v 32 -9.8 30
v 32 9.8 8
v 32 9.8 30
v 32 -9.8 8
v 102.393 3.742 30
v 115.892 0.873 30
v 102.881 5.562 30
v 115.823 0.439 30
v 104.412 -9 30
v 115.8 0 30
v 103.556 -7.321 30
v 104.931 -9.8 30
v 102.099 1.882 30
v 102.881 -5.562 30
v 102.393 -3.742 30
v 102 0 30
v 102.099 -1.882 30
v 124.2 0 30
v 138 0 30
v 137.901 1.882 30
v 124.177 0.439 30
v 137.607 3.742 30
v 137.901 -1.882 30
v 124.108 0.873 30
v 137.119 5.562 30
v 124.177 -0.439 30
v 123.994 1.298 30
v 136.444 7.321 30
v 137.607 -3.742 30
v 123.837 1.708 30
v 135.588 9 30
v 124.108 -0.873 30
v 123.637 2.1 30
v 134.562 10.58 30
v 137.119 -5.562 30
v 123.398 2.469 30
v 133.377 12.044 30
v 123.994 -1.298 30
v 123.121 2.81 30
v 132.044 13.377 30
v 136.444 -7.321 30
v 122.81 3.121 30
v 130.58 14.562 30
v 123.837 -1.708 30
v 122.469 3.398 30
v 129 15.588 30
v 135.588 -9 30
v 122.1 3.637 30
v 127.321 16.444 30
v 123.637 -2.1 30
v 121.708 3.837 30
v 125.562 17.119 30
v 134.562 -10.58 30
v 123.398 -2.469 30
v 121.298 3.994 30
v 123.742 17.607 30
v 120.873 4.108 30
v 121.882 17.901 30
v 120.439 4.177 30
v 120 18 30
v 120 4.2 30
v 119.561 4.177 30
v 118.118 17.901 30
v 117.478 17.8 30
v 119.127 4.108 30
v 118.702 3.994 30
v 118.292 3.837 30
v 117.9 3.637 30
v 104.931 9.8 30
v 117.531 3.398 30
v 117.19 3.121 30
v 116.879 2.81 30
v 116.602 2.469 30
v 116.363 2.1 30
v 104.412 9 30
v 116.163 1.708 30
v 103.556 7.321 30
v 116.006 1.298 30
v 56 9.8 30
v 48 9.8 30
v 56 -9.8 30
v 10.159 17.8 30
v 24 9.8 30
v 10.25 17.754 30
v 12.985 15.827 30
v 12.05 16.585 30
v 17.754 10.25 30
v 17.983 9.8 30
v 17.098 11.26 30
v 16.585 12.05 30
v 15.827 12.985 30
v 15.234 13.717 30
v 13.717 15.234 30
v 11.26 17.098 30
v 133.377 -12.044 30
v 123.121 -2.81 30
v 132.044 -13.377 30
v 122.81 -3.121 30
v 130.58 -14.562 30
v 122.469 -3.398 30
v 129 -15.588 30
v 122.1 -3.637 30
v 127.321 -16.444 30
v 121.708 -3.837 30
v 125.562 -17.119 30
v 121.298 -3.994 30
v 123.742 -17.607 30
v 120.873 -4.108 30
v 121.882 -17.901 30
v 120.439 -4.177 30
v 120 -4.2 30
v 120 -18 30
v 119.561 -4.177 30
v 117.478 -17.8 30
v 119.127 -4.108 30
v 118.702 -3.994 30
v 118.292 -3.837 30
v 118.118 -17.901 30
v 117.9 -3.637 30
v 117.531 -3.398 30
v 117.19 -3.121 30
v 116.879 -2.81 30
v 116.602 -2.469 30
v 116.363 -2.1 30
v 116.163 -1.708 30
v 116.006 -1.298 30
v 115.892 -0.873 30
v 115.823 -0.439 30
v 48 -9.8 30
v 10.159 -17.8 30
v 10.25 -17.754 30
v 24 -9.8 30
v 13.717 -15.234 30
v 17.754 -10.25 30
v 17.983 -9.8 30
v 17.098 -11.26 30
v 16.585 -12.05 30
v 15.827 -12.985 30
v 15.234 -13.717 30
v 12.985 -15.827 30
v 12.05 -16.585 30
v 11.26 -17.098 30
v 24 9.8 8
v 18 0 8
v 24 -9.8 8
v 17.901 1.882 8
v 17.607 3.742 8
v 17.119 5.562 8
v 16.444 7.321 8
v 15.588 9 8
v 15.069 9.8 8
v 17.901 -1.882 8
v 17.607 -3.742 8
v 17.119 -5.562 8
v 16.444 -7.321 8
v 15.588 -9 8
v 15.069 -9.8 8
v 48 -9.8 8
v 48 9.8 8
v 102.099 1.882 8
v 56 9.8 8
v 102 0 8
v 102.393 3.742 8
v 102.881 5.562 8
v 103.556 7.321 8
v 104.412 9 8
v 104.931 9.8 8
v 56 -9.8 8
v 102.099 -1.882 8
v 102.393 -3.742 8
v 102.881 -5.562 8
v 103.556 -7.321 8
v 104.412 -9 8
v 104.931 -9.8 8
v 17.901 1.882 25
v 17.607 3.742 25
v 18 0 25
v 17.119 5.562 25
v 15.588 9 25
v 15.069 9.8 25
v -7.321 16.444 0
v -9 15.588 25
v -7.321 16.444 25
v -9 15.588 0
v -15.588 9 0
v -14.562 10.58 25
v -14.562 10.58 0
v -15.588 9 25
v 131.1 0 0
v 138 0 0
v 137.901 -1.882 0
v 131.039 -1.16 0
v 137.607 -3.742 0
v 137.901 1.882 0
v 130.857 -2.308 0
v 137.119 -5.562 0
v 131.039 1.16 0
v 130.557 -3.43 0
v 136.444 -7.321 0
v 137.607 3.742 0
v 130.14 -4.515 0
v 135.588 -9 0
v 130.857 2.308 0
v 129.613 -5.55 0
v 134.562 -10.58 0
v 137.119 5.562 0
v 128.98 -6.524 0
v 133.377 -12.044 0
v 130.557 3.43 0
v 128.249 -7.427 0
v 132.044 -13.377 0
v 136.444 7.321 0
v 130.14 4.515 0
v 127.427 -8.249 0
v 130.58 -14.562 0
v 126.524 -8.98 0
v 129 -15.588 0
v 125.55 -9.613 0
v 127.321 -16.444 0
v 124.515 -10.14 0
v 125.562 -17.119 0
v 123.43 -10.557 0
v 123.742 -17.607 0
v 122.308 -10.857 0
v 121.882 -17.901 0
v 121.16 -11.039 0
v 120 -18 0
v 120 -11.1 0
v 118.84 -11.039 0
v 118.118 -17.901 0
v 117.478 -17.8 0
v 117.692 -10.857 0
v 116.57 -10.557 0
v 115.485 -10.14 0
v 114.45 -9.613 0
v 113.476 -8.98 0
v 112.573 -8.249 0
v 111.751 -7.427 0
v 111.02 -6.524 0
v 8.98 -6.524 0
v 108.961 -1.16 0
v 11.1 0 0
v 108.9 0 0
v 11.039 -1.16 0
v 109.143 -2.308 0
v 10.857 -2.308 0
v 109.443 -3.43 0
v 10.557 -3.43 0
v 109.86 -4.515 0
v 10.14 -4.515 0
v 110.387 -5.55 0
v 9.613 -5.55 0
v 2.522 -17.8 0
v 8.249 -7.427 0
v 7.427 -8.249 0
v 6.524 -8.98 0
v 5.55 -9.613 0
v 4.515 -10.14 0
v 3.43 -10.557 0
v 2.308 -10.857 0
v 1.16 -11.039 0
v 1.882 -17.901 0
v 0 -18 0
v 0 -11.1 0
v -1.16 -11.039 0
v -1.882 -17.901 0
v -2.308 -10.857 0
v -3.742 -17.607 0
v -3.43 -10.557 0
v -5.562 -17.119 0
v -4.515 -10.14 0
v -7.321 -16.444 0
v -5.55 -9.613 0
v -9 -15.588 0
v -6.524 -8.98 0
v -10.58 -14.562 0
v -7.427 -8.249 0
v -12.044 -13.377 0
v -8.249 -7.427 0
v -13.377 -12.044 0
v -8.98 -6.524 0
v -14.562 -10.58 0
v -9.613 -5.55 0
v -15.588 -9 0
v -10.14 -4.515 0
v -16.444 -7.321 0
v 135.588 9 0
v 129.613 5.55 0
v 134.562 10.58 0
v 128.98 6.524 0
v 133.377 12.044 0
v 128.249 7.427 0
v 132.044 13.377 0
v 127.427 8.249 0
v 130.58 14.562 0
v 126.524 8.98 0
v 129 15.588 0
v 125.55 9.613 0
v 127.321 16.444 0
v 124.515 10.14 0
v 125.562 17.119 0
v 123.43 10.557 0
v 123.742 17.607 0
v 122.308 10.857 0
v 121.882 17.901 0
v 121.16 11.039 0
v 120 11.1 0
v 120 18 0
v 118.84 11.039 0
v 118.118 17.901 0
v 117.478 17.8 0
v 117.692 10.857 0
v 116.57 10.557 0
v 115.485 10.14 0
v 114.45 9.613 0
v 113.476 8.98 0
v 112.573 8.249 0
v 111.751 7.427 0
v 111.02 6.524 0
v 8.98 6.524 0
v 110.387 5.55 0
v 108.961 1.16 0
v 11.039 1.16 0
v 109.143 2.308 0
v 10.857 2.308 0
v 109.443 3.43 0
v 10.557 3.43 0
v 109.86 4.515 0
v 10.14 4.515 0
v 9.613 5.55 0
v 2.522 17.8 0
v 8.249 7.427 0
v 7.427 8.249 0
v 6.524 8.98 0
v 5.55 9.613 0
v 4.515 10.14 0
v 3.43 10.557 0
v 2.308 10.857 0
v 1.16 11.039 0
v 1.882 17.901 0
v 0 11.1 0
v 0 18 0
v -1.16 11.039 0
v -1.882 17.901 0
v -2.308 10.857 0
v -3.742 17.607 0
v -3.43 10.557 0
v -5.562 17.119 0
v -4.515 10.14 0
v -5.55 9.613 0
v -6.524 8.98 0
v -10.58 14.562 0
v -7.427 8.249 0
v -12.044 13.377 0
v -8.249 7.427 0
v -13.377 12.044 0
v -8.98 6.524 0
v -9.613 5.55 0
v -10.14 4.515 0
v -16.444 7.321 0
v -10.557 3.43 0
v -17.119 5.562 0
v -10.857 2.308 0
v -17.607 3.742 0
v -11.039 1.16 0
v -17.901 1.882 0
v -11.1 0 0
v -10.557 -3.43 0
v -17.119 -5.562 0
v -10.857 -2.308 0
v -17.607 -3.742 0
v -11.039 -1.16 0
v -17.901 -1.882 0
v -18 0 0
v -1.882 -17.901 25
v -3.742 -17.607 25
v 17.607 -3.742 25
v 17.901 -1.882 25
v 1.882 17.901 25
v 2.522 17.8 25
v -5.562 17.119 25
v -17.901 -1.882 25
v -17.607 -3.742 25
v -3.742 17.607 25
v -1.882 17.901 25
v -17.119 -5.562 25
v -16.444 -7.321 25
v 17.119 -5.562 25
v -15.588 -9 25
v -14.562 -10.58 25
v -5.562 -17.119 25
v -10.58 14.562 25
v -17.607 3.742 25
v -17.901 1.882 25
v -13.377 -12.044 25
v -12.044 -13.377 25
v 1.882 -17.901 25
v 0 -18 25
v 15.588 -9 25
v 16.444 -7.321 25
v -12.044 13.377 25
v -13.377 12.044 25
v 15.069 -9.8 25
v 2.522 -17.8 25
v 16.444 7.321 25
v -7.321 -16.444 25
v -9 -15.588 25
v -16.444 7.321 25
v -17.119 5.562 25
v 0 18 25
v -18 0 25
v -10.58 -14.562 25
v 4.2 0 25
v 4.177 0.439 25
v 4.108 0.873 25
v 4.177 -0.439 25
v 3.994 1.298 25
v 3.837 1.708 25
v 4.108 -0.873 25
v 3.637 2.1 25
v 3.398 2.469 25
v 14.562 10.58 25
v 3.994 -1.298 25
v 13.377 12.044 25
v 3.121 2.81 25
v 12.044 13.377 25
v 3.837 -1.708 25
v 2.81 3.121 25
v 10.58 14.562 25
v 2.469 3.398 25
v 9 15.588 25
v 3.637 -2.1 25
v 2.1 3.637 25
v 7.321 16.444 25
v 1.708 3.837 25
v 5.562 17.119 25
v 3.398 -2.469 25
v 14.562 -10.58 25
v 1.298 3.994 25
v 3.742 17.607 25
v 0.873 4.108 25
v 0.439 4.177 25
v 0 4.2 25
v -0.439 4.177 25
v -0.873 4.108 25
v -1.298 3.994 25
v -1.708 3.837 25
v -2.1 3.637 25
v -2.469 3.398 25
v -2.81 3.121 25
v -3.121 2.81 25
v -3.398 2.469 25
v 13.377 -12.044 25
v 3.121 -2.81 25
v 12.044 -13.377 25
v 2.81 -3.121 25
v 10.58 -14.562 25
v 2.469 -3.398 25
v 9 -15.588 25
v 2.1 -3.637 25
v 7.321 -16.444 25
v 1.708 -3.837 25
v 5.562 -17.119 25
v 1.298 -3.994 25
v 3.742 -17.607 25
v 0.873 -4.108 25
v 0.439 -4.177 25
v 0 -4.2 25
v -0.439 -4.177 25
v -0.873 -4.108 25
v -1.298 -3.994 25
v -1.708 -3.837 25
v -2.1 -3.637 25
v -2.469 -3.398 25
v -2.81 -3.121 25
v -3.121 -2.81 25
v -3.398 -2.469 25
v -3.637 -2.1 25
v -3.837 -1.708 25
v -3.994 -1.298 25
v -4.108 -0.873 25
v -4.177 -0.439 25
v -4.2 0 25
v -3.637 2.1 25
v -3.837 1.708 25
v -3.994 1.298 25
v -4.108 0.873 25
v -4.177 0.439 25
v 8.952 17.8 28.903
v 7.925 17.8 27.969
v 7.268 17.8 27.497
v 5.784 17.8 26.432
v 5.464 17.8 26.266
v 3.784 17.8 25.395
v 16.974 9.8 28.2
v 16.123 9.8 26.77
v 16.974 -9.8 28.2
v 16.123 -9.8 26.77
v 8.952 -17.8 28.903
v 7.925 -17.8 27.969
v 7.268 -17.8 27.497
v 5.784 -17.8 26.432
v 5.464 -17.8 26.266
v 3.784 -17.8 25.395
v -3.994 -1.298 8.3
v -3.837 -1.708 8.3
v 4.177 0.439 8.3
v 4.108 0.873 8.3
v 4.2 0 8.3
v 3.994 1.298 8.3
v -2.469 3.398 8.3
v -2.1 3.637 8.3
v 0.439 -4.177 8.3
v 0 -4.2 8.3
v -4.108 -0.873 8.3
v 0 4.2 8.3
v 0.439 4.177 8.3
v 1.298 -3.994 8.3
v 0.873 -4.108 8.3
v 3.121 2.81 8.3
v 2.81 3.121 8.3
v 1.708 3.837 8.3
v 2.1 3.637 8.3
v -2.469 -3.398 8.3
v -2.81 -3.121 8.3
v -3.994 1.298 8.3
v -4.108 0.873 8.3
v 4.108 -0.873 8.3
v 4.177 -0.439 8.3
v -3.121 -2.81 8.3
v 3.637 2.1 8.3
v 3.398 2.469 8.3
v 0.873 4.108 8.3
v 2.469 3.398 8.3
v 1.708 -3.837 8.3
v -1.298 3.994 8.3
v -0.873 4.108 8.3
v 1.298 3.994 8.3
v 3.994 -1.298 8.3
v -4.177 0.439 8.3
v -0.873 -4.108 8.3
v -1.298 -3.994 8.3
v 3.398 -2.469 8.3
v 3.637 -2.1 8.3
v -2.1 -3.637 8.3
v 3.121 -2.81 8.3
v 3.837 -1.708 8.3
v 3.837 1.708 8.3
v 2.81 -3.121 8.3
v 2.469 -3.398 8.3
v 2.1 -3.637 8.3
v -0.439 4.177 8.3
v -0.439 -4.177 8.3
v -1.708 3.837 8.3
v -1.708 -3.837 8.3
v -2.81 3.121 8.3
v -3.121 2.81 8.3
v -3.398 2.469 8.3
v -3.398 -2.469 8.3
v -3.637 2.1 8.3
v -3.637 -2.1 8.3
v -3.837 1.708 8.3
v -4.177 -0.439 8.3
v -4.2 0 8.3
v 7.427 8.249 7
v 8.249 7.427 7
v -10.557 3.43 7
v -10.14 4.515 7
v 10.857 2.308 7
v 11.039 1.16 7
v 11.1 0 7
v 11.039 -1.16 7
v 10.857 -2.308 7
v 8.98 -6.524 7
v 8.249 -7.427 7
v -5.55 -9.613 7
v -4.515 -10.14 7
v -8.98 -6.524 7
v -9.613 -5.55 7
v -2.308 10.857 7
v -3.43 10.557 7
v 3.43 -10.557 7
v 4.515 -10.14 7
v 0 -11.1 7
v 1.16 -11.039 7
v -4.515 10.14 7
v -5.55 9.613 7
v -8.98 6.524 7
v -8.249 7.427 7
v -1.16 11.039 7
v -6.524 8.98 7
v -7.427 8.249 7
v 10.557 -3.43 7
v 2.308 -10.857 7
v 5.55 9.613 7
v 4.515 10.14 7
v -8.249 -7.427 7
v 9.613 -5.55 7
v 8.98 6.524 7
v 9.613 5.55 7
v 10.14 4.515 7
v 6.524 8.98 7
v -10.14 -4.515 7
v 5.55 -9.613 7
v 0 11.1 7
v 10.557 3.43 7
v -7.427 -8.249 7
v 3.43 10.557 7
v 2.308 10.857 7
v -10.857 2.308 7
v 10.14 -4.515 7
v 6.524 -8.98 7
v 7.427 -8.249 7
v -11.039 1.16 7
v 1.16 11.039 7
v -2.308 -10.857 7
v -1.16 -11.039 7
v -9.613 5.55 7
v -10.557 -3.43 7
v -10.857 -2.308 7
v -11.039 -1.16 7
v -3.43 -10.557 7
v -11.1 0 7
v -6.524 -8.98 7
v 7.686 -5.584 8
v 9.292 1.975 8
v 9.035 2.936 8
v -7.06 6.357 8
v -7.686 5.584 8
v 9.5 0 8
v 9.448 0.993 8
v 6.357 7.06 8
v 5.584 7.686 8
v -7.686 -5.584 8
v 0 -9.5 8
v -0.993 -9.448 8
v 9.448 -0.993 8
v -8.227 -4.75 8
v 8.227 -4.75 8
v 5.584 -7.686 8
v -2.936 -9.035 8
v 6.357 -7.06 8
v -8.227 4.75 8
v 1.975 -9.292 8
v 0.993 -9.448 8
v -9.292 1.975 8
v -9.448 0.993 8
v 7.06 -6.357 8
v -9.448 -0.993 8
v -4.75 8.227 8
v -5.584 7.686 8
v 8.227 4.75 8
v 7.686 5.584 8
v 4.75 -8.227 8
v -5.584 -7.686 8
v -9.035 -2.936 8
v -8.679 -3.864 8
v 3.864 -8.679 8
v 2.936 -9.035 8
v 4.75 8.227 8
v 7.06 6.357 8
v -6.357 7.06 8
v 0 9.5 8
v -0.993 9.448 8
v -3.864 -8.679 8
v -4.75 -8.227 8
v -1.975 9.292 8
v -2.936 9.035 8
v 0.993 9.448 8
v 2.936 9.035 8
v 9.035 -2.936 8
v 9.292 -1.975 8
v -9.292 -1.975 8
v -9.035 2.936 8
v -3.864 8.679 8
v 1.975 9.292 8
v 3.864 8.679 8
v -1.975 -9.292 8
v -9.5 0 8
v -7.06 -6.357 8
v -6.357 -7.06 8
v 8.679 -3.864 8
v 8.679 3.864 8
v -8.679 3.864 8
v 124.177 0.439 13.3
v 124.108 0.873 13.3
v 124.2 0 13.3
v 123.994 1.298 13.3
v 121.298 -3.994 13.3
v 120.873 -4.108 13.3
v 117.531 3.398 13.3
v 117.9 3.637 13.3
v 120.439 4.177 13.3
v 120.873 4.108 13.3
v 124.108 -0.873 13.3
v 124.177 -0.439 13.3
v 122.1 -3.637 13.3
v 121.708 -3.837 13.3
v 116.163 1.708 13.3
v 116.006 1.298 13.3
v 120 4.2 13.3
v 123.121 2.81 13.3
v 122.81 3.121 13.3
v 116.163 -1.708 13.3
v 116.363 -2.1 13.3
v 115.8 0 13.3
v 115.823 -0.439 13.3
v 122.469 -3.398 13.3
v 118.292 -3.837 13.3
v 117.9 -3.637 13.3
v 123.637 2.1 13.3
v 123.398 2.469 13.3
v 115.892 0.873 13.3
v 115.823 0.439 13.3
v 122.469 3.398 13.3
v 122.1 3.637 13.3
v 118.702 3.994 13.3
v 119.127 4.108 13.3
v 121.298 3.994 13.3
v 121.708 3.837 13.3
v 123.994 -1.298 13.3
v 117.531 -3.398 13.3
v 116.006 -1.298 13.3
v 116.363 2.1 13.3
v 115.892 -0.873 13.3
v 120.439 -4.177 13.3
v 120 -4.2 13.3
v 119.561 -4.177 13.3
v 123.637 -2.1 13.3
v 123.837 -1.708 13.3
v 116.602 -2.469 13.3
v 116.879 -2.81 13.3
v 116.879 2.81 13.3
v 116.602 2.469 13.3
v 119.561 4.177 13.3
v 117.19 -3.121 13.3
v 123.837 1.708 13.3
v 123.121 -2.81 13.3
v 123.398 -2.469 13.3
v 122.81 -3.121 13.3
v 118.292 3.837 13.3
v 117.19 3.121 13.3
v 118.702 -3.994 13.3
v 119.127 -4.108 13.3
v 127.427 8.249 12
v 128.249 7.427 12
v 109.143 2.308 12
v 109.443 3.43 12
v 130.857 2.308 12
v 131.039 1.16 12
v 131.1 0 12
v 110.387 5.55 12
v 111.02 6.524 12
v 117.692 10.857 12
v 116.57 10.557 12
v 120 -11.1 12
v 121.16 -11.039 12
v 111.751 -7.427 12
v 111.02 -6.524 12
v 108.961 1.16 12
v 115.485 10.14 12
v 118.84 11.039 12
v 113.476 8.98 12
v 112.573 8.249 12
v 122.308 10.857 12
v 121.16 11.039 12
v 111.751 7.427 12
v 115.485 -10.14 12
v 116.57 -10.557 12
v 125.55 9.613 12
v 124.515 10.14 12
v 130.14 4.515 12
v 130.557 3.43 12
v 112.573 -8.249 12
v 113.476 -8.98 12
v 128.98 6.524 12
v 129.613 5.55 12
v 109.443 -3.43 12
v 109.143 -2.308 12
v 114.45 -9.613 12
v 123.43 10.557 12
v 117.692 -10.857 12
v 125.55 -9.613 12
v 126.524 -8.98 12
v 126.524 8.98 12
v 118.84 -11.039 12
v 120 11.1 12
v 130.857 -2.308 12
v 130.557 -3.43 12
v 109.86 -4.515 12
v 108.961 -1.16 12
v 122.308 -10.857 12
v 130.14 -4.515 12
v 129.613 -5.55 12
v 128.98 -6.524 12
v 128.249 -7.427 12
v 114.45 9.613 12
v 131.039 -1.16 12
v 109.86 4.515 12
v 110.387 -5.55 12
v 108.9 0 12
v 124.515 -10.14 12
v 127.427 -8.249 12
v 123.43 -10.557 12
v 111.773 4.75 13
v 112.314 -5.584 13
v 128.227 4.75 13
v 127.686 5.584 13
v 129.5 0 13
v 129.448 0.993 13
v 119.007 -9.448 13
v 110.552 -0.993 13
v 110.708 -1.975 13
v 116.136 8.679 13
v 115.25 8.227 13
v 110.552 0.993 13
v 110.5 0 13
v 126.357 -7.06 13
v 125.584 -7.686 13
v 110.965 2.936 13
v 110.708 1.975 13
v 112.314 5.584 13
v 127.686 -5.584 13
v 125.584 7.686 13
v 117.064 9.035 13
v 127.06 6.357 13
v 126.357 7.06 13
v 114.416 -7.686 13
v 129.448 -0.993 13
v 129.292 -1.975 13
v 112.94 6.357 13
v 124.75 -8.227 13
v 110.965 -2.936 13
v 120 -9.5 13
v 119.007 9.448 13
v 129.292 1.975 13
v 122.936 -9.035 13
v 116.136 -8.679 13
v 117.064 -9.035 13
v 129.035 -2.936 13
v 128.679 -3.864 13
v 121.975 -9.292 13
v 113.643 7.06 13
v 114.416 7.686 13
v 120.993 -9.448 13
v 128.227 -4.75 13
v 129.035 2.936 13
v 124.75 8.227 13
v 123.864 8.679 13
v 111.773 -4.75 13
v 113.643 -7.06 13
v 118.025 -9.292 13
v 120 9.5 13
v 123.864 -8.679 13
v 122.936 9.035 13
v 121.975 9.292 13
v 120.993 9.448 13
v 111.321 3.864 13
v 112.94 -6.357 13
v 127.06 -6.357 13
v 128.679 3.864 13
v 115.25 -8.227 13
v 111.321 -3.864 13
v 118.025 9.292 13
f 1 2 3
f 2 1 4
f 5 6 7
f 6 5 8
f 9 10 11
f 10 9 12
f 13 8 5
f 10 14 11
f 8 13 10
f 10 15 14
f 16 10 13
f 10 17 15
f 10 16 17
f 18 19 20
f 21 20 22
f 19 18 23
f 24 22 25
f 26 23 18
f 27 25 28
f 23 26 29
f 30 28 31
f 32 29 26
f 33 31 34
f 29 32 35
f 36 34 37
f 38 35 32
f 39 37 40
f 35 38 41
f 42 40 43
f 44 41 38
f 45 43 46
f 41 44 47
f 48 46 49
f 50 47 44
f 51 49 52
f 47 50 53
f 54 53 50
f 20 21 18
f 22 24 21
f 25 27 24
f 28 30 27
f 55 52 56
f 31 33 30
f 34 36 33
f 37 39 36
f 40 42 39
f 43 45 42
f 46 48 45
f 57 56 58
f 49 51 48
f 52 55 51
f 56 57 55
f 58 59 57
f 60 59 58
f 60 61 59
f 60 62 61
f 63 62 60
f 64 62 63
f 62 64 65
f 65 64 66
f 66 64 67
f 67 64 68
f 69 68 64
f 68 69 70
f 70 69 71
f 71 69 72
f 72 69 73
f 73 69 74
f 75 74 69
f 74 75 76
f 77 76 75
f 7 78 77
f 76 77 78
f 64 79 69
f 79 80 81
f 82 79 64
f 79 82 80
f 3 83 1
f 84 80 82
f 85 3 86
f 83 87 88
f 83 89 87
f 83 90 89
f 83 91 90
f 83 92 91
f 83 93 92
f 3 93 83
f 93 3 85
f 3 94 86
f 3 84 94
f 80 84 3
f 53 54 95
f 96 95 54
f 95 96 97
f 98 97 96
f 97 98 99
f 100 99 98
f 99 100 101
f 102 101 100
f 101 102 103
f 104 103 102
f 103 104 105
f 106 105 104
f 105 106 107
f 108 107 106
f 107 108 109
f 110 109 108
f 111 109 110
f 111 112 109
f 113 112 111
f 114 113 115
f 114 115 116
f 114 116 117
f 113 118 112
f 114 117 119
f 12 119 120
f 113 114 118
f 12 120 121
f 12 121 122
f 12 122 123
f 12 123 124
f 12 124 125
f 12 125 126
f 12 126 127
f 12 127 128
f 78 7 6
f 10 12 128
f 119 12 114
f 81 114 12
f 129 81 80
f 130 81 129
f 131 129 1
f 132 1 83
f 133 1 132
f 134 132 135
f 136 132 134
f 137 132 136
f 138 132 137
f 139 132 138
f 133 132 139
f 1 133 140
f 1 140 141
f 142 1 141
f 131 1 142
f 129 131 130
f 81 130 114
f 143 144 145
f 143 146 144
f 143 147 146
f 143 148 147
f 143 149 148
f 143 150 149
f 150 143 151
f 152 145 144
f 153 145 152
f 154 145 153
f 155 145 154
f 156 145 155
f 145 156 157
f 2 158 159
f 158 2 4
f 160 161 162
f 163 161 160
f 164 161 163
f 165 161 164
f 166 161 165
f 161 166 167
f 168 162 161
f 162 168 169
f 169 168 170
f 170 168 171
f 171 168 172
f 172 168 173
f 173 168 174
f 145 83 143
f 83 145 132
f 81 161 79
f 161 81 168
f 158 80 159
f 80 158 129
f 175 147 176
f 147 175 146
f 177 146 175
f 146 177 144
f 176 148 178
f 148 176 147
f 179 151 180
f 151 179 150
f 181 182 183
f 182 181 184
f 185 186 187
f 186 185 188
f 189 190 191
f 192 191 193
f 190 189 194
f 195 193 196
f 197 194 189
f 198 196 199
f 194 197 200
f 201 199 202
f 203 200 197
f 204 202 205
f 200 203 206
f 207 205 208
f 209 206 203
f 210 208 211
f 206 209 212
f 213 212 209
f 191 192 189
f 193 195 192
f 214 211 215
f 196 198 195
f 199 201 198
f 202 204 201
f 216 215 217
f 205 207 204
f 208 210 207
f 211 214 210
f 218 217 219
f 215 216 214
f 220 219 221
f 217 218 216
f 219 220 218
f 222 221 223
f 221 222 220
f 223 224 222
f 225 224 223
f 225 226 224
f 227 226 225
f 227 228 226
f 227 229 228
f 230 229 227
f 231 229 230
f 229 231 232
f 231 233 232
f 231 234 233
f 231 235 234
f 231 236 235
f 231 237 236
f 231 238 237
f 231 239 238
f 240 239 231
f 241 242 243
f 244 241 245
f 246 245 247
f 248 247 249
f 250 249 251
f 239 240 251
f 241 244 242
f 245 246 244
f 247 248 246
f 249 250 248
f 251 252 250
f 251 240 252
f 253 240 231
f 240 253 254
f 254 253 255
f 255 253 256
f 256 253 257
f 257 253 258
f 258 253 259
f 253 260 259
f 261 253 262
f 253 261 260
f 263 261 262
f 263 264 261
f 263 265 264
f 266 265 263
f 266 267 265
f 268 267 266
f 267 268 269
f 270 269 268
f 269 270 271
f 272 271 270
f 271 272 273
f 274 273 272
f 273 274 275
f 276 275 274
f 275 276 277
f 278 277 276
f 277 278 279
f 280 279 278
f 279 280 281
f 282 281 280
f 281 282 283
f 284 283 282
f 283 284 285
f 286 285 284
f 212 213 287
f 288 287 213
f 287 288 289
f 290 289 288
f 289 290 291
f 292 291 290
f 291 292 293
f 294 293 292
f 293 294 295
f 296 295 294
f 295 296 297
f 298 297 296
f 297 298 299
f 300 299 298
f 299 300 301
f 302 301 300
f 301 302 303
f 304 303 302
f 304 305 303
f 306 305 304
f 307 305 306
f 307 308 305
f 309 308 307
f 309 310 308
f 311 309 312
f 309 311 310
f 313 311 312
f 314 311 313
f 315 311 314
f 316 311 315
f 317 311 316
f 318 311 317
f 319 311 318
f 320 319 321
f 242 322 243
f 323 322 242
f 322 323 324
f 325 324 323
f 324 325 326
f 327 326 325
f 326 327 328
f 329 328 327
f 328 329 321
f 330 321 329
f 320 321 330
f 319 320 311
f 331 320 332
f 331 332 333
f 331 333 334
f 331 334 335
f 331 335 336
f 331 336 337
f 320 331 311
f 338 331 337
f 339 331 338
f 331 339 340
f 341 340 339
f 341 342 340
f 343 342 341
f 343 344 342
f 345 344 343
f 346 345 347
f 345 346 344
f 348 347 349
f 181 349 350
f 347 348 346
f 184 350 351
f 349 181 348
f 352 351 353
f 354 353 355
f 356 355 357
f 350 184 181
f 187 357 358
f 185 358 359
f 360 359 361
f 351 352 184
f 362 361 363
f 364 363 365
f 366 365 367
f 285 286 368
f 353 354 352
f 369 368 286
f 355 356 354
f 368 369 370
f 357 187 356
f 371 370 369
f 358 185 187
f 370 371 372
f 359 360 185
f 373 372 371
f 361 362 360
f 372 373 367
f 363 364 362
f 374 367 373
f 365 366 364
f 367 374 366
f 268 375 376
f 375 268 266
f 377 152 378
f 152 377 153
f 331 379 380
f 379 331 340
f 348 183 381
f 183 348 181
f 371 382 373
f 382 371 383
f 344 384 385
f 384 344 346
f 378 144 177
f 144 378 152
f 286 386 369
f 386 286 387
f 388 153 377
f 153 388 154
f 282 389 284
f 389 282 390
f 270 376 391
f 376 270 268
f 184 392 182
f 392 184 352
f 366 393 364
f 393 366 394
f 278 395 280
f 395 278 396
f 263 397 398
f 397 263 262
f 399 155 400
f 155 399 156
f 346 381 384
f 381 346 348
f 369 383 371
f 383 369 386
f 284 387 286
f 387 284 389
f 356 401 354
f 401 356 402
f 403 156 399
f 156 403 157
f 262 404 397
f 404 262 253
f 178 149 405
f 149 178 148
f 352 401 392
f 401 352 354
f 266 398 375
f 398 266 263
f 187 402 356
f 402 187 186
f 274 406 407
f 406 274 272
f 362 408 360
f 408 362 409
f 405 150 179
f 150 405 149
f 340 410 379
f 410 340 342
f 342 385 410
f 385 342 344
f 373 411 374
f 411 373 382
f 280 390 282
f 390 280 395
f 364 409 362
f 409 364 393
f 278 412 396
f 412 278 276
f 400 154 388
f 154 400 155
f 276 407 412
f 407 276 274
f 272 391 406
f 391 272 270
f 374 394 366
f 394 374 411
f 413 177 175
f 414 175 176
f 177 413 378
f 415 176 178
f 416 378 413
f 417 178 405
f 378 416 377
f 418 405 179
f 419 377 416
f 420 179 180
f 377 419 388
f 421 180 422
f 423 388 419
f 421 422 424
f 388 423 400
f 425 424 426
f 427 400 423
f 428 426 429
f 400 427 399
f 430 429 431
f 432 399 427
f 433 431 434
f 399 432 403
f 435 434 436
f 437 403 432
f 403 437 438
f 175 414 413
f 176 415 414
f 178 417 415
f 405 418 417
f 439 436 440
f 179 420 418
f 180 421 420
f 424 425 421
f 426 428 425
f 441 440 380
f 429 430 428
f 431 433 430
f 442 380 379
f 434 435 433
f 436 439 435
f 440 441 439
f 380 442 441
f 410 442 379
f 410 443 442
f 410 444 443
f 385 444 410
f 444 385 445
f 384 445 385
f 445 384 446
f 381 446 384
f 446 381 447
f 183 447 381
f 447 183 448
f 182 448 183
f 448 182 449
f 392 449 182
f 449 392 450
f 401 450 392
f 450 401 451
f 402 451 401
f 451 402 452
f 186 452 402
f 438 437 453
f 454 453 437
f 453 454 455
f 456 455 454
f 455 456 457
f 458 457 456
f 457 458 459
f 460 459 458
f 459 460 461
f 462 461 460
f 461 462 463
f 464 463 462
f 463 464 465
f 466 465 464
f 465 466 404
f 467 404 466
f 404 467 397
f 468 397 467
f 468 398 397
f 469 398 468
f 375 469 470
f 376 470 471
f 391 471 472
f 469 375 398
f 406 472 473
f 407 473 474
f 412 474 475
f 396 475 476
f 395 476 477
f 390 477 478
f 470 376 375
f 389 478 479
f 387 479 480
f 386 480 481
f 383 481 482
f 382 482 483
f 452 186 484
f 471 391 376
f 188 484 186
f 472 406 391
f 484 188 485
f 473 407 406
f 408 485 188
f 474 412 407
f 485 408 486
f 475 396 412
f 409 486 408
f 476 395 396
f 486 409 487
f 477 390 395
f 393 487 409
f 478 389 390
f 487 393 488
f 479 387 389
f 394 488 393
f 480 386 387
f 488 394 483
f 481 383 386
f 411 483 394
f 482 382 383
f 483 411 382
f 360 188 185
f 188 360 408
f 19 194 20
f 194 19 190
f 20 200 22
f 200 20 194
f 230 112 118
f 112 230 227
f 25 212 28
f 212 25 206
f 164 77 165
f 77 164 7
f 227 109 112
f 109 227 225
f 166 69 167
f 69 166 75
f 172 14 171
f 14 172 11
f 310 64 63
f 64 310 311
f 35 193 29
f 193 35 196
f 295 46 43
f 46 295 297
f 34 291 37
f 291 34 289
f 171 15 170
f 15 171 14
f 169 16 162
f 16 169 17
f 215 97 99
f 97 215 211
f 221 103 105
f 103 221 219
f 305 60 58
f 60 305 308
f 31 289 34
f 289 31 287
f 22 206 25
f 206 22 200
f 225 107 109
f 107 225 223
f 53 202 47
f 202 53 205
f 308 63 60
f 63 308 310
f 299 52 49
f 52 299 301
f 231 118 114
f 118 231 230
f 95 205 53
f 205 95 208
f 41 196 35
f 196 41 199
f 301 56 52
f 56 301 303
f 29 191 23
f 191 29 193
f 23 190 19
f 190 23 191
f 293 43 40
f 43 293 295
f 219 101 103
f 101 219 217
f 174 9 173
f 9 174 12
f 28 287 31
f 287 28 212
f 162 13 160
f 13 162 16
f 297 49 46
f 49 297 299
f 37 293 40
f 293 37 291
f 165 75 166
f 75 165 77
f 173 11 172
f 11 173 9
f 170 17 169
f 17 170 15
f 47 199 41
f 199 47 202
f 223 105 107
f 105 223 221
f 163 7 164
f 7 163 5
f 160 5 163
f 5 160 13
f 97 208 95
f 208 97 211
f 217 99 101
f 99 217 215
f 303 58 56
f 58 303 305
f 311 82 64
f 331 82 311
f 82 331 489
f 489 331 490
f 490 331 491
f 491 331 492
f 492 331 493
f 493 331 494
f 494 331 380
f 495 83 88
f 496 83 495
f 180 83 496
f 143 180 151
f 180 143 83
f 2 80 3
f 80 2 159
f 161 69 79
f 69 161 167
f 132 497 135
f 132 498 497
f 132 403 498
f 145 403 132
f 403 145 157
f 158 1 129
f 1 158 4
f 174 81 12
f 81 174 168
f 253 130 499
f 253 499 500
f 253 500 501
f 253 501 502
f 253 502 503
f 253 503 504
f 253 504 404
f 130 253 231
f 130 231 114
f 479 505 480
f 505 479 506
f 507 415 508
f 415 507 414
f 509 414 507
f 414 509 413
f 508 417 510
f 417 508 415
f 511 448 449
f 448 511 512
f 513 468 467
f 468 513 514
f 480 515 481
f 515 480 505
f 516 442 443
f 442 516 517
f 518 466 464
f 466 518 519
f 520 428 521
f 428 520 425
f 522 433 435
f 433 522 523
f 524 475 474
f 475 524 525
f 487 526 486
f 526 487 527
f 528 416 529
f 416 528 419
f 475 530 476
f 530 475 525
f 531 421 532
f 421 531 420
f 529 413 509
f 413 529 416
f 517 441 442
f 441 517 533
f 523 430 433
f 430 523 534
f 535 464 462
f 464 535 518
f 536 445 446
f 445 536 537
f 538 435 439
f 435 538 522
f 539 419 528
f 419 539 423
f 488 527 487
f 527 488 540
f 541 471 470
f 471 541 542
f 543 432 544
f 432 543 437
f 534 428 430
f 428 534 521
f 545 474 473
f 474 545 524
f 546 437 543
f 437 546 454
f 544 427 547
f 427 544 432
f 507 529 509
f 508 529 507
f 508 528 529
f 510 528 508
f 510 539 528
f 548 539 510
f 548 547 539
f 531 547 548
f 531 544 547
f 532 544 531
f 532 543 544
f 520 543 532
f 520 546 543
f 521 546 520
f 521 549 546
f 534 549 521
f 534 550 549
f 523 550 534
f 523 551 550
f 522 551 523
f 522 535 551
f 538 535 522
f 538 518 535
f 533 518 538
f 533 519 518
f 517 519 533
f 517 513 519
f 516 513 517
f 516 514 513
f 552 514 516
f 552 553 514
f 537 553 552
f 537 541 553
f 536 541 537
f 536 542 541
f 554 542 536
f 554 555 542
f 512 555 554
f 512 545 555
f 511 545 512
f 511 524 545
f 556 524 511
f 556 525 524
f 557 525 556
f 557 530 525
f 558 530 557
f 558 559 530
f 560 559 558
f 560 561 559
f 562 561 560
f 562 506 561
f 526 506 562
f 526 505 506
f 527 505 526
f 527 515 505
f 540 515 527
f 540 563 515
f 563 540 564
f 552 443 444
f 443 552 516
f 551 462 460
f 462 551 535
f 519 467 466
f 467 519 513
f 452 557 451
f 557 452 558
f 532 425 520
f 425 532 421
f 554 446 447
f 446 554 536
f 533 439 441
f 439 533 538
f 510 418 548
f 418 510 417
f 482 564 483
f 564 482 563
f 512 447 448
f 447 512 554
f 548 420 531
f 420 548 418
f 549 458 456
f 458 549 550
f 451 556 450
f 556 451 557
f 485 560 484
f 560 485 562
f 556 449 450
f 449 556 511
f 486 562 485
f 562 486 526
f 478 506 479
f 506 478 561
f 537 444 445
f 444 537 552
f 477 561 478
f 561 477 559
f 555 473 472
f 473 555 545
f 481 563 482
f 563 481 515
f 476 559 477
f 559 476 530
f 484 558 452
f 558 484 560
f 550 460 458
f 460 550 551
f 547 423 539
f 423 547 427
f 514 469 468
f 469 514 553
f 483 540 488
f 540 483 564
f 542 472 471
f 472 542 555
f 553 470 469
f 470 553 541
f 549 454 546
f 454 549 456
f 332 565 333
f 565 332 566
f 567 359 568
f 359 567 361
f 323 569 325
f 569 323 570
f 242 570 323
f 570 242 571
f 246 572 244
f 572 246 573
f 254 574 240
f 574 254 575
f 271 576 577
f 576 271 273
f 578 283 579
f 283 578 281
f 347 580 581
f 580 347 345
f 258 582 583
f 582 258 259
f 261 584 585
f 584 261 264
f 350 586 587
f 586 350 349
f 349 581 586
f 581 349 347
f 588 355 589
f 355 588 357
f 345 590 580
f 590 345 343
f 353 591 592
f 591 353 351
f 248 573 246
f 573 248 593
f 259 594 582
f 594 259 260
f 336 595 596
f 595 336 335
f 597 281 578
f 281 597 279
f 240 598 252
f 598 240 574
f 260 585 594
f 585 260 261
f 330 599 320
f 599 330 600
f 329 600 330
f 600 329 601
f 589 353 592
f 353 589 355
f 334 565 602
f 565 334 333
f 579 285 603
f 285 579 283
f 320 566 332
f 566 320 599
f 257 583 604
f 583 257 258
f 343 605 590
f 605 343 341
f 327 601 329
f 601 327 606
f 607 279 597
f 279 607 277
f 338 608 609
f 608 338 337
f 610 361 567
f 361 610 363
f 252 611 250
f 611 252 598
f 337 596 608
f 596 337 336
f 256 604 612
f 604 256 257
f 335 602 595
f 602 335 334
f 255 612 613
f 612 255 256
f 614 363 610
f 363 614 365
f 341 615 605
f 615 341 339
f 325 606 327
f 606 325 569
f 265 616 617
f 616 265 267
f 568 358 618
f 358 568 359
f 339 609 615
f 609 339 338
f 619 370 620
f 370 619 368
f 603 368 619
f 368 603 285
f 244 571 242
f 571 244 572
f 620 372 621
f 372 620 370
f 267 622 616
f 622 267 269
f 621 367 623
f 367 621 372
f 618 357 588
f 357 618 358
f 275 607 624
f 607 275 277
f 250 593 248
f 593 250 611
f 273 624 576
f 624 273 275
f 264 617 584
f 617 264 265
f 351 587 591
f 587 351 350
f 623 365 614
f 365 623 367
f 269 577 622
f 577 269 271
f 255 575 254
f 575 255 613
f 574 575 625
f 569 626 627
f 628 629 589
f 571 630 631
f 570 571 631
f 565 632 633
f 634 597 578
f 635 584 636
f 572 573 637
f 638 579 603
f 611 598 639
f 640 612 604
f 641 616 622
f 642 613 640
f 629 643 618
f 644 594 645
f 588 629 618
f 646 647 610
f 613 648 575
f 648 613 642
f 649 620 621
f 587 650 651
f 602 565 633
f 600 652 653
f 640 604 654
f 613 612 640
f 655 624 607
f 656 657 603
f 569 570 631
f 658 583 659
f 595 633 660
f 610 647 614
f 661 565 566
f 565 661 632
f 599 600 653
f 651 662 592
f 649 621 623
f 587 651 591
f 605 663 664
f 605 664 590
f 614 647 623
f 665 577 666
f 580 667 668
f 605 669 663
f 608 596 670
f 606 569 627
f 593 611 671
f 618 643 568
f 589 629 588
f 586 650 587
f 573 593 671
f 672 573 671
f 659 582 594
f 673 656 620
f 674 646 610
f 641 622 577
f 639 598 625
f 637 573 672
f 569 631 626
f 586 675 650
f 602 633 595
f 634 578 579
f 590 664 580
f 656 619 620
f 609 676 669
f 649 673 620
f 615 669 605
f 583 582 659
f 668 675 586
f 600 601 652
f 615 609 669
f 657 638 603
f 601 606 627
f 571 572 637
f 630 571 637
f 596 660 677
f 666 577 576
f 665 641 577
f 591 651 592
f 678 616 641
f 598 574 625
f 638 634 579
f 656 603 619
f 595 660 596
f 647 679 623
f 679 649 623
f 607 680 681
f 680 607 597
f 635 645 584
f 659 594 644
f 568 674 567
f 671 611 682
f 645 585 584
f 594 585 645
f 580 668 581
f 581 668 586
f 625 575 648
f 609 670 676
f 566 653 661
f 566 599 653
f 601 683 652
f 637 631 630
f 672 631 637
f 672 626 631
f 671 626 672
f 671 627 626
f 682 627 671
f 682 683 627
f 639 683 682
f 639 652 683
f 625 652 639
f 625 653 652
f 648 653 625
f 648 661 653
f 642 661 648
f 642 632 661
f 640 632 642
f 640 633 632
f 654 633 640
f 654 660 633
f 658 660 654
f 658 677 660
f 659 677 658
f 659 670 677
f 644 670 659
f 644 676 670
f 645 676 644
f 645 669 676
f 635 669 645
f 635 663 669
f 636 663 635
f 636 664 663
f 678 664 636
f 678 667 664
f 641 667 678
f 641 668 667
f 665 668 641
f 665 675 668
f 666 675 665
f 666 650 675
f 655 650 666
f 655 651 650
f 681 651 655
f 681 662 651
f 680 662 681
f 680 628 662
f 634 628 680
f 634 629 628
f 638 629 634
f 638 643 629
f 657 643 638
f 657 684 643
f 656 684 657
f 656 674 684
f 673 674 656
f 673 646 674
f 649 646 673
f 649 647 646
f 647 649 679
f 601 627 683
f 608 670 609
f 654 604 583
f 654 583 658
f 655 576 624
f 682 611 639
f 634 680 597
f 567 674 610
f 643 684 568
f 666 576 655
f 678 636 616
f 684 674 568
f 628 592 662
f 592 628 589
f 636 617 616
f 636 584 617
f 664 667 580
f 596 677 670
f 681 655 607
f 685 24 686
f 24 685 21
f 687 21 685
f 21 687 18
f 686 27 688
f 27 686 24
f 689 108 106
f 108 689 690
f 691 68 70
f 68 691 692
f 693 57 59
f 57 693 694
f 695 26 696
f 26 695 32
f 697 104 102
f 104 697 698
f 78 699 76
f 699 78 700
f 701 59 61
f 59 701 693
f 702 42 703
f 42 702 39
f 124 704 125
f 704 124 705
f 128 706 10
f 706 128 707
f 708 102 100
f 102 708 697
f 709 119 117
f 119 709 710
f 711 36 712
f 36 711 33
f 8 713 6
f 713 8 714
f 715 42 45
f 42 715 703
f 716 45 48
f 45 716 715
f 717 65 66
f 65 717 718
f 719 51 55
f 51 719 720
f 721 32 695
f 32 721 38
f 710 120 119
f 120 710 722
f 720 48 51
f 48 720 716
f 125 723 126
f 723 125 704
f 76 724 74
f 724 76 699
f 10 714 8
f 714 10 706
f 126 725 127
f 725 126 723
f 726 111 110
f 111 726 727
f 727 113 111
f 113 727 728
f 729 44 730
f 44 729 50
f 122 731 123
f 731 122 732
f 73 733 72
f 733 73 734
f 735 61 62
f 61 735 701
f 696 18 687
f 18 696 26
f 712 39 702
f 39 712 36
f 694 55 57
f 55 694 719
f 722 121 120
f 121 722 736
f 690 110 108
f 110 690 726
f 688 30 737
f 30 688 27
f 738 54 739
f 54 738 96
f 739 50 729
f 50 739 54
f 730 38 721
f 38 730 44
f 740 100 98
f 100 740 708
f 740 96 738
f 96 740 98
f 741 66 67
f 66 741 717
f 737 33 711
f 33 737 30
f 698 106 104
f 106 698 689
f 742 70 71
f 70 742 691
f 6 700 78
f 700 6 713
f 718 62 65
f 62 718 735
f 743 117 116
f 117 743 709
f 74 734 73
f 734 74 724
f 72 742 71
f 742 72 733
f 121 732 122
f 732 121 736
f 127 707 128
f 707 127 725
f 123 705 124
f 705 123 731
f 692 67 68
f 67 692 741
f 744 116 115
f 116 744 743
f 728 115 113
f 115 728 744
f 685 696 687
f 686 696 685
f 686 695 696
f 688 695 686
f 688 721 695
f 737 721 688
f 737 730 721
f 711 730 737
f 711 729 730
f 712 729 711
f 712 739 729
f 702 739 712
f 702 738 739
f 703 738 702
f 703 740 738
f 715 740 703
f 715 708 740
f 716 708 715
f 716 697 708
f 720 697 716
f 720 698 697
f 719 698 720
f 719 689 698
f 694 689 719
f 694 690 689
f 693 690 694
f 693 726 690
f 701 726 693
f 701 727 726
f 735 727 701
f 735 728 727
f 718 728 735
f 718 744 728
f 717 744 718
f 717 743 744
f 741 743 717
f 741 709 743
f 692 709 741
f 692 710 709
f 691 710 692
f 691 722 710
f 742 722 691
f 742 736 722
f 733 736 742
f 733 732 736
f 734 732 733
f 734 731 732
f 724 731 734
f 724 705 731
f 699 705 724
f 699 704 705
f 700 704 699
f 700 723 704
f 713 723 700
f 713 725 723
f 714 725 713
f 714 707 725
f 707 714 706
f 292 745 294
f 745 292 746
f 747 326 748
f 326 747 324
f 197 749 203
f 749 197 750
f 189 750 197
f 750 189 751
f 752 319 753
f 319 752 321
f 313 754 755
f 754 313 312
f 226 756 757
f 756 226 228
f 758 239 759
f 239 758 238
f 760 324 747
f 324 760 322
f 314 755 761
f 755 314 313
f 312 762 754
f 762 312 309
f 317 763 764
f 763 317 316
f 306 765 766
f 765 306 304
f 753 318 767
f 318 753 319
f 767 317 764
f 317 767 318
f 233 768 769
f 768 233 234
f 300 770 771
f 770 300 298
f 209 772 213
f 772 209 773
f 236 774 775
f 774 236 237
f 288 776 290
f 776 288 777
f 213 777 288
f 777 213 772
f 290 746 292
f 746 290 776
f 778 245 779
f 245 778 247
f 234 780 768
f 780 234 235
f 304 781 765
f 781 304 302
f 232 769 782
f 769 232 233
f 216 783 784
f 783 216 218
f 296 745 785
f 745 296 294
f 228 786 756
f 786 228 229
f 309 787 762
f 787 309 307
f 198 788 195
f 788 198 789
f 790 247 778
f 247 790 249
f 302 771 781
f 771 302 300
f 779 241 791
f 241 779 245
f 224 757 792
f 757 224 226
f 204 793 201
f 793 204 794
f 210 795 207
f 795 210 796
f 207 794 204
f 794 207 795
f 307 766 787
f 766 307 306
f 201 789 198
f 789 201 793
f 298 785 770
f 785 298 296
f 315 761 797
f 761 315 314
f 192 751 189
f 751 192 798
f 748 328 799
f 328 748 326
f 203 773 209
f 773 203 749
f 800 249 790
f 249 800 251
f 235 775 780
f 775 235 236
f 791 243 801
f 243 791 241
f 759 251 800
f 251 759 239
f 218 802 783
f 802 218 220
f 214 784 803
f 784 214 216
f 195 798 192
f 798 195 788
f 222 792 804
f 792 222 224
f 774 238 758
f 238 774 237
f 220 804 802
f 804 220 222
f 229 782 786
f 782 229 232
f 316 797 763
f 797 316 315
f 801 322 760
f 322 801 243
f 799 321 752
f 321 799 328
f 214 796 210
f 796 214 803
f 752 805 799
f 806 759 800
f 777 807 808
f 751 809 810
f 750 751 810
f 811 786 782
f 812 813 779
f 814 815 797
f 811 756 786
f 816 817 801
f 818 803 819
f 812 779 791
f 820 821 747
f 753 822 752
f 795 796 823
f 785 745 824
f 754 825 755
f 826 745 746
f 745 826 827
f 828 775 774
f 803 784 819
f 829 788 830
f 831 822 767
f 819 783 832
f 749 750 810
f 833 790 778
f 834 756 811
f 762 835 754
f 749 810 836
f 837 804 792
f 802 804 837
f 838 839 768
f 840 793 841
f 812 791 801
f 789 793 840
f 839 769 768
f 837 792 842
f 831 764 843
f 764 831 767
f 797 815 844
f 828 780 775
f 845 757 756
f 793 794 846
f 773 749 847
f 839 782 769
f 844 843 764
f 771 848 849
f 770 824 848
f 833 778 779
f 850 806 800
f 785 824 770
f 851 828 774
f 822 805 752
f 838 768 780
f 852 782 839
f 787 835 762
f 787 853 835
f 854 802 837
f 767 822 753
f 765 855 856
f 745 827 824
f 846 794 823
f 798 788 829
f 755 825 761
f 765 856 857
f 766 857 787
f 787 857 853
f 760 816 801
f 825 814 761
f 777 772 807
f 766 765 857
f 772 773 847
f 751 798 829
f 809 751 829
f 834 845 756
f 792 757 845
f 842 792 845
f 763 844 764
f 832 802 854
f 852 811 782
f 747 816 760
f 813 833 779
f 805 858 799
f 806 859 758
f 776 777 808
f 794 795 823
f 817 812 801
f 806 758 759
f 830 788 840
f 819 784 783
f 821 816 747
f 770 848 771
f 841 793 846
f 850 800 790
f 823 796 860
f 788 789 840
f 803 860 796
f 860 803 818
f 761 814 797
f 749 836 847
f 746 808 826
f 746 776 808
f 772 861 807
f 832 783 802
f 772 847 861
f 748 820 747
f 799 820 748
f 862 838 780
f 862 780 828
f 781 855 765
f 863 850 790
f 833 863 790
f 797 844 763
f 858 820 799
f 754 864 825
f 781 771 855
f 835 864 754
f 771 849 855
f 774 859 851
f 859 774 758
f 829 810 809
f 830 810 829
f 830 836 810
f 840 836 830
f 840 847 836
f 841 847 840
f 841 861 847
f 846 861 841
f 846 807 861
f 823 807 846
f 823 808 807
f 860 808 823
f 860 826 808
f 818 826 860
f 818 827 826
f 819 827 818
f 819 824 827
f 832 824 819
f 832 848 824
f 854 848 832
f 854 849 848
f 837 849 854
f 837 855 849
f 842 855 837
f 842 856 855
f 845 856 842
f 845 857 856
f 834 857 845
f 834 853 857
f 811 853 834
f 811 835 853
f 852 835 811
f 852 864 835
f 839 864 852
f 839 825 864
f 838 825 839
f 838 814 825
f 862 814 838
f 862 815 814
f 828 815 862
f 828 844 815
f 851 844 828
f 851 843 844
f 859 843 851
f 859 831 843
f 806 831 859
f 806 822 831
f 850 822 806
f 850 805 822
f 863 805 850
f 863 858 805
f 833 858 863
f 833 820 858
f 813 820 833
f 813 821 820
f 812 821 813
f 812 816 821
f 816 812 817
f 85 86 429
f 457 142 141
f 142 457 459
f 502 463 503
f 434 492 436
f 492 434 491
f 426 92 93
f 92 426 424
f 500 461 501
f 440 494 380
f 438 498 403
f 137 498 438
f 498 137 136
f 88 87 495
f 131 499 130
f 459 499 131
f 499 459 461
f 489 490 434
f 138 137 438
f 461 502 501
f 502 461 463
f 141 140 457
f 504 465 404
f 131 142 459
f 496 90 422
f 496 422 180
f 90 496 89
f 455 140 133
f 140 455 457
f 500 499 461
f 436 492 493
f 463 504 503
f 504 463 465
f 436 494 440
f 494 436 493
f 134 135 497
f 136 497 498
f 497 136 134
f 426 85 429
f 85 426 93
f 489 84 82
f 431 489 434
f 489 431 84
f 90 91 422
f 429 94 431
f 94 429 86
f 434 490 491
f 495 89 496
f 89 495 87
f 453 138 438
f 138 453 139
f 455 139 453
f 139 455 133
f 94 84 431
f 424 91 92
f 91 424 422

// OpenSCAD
module arm() {
	length=120;
	width=36;
	walls=8;
	height=30;
	difference() {
		union() {
			// rounded ends
			color("red") translate([0,0,0]) cylinder(r=width/2,h=25, $fn=60);
			translate([length,0,0]) cylinder(r=width/2,h=height, $fn=60);
			// body
			translate([0,width/2-walls-0.2,0]) cube([length, walls, height]);
			translate([0,-width/2+0.2,0]) cube([length, walls, height]);
			for(i=[0:1]) translate([24+24*i,-width/2+walls,walls]) cube([walls, width-(walls*2), height-walls]);
			translate([0,-width/2+walls,0]) cube([length, width-(walls*2), walls]);
			// bearings
			translate([0,0,0]) cylinder(r=28/2,h=12, $fn=60);
			translate([length,0,0]) cylinder(r=28/2,h=12, $fn=60);
		}
		union() {
			// left holes
			translate([0,0,8.3]) cylinder(r=8.4/2,h=25, $fn=60);
			translate([0,0,-1]) cylinder(r=22.2/2,h=8, $fn=60);
			//translate([0,0,25-5.5]) cylinder(r=14.5/2, h=5.5+1, $fn=6);
			translate([0,0,7]) cylinder(r1=22.2/2, r2=19/2,h=1, $fn=60);
			// right holes
			translate([length,0,8.3+5]) cylinder(r=8.4/2,h=25+2, $fn=60);
			translate([length,0,-1]) cylinder(r=22.2/2,h=8+5, $fn=60);
			translate([length,0,7+5]) cylinder(r1=22.2/2, r2=19/2,h=1, $fn=60);
			// top of first end
			translate([0,0,25]) cylinder(r1=width/2, r2=width/2+5,h=10, $fn=60);
		}
	}
}

arm();
